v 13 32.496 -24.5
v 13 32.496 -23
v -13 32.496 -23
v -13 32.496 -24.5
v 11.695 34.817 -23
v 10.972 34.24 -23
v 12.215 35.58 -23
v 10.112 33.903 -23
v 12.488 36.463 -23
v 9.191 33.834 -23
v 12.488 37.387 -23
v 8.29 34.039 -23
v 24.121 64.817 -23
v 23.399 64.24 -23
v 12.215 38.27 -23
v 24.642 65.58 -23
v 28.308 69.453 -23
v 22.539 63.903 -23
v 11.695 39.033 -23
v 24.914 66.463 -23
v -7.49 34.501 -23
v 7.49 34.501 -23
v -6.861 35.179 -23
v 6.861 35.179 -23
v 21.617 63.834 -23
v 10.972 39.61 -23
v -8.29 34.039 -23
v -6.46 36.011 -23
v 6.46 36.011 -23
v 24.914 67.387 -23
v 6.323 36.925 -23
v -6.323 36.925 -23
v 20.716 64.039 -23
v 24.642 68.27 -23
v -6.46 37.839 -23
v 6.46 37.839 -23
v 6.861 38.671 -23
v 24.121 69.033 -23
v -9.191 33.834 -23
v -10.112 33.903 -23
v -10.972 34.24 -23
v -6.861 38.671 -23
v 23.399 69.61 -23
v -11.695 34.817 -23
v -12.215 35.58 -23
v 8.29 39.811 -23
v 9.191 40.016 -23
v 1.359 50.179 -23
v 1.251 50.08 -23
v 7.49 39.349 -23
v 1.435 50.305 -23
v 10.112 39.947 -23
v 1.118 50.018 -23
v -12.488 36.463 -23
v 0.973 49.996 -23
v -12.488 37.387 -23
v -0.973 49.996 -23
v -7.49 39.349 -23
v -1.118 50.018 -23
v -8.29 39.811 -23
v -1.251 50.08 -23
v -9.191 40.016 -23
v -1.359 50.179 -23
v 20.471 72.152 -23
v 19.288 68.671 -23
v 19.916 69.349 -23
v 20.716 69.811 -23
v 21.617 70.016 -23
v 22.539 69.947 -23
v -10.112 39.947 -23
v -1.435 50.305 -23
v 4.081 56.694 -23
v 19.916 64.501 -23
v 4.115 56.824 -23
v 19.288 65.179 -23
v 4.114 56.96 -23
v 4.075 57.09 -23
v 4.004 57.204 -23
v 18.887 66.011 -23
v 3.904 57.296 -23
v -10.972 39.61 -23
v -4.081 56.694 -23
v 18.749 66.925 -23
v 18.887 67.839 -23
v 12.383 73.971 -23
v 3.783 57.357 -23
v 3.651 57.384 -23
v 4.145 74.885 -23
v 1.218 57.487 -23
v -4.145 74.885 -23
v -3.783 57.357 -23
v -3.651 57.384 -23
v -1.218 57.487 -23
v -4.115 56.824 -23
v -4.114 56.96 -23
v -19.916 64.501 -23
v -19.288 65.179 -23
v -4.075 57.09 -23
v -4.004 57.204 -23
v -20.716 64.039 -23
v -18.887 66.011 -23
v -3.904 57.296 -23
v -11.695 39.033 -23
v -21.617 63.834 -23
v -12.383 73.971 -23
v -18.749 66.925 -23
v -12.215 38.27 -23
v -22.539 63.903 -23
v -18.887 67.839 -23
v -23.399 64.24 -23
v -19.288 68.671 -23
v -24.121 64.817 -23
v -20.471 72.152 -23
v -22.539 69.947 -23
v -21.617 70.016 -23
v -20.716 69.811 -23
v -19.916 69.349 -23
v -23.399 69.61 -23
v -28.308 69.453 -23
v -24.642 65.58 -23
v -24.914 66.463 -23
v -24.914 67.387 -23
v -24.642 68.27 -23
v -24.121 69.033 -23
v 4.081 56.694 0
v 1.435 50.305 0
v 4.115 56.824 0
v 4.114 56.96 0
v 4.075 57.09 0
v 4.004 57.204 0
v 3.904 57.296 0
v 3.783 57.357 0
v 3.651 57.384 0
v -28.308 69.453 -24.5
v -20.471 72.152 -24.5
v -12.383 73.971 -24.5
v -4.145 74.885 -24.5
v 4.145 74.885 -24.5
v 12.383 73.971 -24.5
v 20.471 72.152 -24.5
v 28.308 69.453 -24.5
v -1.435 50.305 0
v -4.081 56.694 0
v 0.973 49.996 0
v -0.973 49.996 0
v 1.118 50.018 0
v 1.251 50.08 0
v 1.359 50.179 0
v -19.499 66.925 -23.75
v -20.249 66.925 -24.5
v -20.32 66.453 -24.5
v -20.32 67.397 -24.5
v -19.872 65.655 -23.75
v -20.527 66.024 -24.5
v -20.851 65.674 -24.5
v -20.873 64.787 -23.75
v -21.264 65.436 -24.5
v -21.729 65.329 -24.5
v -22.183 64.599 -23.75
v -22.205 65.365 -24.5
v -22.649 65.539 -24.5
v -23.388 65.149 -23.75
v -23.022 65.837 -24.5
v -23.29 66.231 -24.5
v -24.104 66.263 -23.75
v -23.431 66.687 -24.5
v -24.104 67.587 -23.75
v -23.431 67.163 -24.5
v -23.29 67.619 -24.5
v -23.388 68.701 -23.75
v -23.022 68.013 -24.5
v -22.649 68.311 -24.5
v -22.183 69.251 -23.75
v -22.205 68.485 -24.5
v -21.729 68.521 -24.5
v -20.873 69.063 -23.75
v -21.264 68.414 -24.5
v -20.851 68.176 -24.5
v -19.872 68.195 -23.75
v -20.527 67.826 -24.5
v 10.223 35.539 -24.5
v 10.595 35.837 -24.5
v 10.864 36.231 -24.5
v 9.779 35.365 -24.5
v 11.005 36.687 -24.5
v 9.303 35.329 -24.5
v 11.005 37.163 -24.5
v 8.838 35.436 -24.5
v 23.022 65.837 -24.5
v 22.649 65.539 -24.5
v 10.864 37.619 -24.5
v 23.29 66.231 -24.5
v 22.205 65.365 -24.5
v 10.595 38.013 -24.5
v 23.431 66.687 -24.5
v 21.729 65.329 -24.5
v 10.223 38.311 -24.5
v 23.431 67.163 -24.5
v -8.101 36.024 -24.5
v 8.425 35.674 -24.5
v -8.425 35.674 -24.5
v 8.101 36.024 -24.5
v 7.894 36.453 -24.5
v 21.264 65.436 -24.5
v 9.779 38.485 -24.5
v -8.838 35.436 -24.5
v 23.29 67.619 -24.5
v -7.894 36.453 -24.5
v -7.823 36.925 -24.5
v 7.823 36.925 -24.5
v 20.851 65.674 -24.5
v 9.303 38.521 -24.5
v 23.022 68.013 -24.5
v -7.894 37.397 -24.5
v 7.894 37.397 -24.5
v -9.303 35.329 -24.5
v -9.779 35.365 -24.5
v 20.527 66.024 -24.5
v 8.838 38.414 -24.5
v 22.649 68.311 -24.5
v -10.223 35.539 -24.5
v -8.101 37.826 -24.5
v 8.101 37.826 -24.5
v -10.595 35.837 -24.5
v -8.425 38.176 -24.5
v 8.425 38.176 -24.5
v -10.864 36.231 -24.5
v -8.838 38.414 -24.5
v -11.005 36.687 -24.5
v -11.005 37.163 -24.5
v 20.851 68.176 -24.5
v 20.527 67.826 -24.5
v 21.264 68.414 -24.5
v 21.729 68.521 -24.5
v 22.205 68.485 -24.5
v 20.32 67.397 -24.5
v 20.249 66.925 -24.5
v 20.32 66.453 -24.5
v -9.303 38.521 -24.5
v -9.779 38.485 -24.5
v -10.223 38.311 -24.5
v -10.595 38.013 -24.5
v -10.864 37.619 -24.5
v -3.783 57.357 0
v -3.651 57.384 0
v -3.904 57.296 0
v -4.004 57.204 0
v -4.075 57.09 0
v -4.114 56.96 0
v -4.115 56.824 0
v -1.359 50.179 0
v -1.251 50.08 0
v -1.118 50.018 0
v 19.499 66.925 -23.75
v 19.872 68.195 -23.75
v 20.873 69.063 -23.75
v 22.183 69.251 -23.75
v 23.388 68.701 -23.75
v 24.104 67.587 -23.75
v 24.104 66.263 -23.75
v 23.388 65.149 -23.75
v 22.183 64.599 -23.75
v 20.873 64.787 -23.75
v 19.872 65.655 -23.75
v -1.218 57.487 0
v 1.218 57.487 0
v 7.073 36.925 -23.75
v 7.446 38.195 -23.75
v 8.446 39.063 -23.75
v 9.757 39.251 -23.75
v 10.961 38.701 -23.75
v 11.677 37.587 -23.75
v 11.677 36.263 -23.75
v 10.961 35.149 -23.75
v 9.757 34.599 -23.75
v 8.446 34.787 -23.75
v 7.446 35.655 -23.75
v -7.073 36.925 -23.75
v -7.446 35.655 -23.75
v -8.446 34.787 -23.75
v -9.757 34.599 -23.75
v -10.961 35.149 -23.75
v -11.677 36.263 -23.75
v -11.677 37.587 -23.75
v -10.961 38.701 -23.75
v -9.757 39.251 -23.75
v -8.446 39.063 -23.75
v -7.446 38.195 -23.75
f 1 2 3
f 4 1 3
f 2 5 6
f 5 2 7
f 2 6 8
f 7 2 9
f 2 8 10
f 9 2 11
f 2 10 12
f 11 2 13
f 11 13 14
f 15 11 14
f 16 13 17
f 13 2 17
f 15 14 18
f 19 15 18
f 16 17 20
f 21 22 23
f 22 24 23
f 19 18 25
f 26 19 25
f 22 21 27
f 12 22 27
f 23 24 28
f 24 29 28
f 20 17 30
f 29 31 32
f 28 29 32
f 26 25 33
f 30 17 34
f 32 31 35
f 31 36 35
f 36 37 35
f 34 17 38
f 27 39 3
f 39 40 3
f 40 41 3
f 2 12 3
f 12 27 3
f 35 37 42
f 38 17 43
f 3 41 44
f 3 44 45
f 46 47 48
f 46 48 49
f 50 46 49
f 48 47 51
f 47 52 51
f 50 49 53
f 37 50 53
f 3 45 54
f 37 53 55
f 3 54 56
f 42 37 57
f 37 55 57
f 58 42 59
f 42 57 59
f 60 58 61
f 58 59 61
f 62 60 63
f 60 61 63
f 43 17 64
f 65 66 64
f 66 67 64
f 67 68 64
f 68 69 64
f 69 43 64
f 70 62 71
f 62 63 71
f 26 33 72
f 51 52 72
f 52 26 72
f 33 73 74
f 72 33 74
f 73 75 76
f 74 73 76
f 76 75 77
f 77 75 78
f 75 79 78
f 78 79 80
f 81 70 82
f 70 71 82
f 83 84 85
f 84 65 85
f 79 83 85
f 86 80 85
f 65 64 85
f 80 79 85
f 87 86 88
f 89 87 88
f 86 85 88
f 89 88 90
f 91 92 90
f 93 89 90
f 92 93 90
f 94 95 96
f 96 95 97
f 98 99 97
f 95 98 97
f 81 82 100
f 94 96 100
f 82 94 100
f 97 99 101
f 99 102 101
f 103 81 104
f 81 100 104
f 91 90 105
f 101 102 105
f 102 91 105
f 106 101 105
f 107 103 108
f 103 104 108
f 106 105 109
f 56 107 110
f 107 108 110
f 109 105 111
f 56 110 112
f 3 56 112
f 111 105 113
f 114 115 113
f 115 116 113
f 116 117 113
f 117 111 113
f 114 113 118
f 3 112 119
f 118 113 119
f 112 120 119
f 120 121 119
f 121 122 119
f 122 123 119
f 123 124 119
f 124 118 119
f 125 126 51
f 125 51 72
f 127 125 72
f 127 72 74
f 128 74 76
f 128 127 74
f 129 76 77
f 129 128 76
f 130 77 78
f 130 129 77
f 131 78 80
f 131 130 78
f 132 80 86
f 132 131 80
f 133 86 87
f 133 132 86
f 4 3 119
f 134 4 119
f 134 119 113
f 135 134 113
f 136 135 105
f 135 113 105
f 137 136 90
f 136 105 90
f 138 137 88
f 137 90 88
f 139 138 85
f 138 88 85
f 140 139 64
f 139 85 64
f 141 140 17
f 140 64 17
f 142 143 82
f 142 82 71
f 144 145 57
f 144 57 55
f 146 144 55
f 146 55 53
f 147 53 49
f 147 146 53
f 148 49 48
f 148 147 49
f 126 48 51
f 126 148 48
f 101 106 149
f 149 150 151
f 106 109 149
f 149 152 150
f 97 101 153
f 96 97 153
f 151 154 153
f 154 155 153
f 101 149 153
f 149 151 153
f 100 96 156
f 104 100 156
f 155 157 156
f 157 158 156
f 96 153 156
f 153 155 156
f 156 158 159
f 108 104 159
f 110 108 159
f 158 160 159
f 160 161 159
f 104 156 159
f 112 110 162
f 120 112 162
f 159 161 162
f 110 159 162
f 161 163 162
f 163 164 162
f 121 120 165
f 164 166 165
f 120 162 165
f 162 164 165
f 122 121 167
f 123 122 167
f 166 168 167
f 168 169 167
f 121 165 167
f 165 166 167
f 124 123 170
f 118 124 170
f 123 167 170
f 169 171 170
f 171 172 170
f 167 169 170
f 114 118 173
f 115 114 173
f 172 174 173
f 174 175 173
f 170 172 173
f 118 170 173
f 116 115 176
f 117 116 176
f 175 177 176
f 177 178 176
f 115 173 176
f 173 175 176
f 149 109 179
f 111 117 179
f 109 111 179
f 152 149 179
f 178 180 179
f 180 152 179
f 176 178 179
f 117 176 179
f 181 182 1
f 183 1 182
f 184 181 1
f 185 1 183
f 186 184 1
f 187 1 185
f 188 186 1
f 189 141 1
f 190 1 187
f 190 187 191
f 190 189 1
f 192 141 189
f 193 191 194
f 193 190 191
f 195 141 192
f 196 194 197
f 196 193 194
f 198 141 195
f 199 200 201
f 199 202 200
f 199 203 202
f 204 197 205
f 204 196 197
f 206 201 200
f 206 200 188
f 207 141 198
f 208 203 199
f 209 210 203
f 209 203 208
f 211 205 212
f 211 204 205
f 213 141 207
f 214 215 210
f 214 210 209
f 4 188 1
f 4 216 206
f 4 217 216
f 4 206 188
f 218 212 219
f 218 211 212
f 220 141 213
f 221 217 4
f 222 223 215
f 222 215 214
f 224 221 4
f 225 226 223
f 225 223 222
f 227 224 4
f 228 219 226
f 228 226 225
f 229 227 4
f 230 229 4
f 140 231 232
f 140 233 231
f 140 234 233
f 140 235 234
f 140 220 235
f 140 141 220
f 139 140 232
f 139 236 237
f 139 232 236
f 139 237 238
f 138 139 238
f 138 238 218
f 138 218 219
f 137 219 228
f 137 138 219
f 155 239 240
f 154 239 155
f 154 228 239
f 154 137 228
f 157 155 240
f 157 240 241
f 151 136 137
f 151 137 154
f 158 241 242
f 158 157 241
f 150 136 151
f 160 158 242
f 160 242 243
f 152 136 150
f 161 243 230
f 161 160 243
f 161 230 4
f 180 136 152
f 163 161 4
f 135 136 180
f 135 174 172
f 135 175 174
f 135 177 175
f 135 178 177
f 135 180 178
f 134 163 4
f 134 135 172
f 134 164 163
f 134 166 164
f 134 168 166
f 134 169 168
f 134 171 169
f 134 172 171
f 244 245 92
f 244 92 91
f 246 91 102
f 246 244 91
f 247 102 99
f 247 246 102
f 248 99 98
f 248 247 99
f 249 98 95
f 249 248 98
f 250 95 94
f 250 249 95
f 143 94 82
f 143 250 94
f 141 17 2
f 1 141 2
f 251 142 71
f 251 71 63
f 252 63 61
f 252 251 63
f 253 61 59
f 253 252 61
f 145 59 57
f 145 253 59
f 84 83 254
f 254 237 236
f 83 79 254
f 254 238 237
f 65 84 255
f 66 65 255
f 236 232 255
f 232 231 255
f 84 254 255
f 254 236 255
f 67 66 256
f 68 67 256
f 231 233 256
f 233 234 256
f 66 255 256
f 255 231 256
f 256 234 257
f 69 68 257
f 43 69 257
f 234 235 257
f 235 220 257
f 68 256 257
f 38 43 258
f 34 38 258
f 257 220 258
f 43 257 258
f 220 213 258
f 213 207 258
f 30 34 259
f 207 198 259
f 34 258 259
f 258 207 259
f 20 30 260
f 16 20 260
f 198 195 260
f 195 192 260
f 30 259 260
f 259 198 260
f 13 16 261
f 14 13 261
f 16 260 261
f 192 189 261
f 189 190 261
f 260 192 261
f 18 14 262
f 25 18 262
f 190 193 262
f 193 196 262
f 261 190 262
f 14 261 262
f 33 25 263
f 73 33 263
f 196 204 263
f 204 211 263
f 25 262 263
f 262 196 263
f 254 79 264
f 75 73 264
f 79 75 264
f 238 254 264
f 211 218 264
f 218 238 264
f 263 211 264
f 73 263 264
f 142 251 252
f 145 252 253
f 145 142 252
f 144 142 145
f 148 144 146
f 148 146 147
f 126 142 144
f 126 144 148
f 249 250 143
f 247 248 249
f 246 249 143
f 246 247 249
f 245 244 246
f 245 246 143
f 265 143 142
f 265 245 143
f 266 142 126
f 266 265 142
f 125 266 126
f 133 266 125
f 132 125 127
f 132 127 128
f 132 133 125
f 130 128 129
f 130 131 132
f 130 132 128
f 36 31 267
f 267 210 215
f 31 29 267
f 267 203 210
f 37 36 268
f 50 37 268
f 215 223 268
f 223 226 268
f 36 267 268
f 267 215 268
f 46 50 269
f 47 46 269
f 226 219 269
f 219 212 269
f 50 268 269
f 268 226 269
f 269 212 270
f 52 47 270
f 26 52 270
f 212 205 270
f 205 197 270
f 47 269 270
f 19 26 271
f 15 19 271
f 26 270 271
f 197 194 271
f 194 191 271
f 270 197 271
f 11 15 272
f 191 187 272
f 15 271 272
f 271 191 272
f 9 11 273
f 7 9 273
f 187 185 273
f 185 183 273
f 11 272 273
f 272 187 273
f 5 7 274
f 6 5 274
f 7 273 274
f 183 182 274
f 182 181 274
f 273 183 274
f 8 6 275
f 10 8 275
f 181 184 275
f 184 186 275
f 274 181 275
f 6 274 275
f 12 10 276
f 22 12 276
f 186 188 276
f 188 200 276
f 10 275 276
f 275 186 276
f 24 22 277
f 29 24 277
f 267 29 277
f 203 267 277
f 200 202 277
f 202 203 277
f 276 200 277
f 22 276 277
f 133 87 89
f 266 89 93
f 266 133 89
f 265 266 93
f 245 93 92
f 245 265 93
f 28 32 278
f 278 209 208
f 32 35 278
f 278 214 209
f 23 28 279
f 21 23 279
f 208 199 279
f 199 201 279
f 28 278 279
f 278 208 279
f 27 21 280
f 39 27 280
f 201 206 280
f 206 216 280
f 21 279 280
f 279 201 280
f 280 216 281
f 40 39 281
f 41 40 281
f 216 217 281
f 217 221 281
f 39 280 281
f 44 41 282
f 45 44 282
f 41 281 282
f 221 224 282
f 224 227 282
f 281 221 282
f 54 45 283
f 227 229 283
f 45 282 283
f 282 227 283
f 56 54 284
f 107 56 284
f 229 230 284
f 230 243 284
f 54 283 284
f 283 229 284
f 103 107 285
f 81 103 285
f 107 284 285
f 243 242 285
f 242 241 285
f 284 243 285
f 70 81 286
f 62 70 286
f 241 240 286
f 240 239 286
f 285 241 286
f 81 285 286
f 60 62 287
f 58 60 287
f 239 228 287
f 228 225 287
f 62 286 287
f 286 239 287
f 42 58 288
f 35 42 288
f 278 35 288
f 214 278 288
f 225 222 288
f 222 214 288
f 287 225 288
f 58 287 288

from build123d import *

# Parameters (mm, degrees)
BOSS_EXTRUDE1_DEPTH = 23
SKETCH5_R           = 1.6
BOSS_EXTRUDE2_DEPTH = 1.5
CHAMFER1_SIZE       = 1.5


with BuildPart() as part:
    # Sketch1 → Boss-Extrude1 (new body)
    with BuildSketch(Plane.XY):
        with BuildLine():
            Line((-4.081066361, 56.693646837), (-1.434724284, 50.304811902))
            ThreePointArc((-1.434724284, 50.304811902), (-1.250569634, 50.080418812), (-0.972784517, 49.996153619))
            Line((-0.972784517, 49.996153619), (0.972784517, 49.996153619))
            ThreePointArc((0.972784517, 49.996153619), (1.250569634, 50.080418812), (1.434724284, 50.304811902))
            Line((1.434724284, 50.304811902), (4.081066361, 56.693646837))
            ThreePointArc((4.081066361, 56.693646837), (4.043474856, 57.149428628), (3.65087332, 57.383979681))
            ThreePointArc((3.65087332, 57.383979681), (0, 57.5), (-3.65087332, 57.383979681))
            ThreePointArc((-3.65087332, 57.383979681), (-4.043474856, 57.149428628), (-4.081066361, 56.693646837))
        make_face()
    extrude(amount=-BOSS_EXTRUDE1_DEPTH)

    # Sketch5 → Boss-Extrude2 (add)
    with BuildSketch(Plane(origin=(0, 0, -23), x_dir=(-1, 0, 0), z_dir=(0, 0, -1))):
        with BuildLine():
            Line((-28.307864731, 69.452608262), (-13, 32.496153619))
            Line((-13, 32.496153619), (13, 32.496153619))
            Line((13, 32.496153619), (28.307864731, 69.452608262))
            ThreePointArc((28.307864731, 69.452608262), (0, 75), (-28.307864731, 69.452608262))
        make_face()
        with Locations((-21.848934107, 66.925)):
            Circle(SKETCH5_R, mode=Mode.SUBTRACT)
        with Locations(Location((21.848934107, 66.925, 0), (0, 0, 180))):
            Circle(SKETCH5_R, mode=Mode.SUBTRACT)
        with Locations((-9.422527235, 36.925)):
            Circle(SKETCH5_R, mode=Mode.SUBTRACT)
        with Locations(Location((9.422527235, 36.925, 0), (0, 0, 180))):
            Circle(SKETCH5_R, mode=Mode.SUBTRACT)
    extrude(amount=BOSS_EXTRUDE2_DEPTH)

    # Chamfer1
    chamfer1_edges = [part.edges().sort_by_distance(p)[0] for p in [
        (23.448934107, 66.925, -23),
        (-23.448934107, 66.925, -23),
        (11.022527235, 36.925, -23),
        (-11.022527235, 36.925, -23),
    ]]
    chamfer(chamfer1_edges, length=CHAMFER1_SIZE - 0.0001)  # a hair under: the kernel refuses the full size


solid = part.part
